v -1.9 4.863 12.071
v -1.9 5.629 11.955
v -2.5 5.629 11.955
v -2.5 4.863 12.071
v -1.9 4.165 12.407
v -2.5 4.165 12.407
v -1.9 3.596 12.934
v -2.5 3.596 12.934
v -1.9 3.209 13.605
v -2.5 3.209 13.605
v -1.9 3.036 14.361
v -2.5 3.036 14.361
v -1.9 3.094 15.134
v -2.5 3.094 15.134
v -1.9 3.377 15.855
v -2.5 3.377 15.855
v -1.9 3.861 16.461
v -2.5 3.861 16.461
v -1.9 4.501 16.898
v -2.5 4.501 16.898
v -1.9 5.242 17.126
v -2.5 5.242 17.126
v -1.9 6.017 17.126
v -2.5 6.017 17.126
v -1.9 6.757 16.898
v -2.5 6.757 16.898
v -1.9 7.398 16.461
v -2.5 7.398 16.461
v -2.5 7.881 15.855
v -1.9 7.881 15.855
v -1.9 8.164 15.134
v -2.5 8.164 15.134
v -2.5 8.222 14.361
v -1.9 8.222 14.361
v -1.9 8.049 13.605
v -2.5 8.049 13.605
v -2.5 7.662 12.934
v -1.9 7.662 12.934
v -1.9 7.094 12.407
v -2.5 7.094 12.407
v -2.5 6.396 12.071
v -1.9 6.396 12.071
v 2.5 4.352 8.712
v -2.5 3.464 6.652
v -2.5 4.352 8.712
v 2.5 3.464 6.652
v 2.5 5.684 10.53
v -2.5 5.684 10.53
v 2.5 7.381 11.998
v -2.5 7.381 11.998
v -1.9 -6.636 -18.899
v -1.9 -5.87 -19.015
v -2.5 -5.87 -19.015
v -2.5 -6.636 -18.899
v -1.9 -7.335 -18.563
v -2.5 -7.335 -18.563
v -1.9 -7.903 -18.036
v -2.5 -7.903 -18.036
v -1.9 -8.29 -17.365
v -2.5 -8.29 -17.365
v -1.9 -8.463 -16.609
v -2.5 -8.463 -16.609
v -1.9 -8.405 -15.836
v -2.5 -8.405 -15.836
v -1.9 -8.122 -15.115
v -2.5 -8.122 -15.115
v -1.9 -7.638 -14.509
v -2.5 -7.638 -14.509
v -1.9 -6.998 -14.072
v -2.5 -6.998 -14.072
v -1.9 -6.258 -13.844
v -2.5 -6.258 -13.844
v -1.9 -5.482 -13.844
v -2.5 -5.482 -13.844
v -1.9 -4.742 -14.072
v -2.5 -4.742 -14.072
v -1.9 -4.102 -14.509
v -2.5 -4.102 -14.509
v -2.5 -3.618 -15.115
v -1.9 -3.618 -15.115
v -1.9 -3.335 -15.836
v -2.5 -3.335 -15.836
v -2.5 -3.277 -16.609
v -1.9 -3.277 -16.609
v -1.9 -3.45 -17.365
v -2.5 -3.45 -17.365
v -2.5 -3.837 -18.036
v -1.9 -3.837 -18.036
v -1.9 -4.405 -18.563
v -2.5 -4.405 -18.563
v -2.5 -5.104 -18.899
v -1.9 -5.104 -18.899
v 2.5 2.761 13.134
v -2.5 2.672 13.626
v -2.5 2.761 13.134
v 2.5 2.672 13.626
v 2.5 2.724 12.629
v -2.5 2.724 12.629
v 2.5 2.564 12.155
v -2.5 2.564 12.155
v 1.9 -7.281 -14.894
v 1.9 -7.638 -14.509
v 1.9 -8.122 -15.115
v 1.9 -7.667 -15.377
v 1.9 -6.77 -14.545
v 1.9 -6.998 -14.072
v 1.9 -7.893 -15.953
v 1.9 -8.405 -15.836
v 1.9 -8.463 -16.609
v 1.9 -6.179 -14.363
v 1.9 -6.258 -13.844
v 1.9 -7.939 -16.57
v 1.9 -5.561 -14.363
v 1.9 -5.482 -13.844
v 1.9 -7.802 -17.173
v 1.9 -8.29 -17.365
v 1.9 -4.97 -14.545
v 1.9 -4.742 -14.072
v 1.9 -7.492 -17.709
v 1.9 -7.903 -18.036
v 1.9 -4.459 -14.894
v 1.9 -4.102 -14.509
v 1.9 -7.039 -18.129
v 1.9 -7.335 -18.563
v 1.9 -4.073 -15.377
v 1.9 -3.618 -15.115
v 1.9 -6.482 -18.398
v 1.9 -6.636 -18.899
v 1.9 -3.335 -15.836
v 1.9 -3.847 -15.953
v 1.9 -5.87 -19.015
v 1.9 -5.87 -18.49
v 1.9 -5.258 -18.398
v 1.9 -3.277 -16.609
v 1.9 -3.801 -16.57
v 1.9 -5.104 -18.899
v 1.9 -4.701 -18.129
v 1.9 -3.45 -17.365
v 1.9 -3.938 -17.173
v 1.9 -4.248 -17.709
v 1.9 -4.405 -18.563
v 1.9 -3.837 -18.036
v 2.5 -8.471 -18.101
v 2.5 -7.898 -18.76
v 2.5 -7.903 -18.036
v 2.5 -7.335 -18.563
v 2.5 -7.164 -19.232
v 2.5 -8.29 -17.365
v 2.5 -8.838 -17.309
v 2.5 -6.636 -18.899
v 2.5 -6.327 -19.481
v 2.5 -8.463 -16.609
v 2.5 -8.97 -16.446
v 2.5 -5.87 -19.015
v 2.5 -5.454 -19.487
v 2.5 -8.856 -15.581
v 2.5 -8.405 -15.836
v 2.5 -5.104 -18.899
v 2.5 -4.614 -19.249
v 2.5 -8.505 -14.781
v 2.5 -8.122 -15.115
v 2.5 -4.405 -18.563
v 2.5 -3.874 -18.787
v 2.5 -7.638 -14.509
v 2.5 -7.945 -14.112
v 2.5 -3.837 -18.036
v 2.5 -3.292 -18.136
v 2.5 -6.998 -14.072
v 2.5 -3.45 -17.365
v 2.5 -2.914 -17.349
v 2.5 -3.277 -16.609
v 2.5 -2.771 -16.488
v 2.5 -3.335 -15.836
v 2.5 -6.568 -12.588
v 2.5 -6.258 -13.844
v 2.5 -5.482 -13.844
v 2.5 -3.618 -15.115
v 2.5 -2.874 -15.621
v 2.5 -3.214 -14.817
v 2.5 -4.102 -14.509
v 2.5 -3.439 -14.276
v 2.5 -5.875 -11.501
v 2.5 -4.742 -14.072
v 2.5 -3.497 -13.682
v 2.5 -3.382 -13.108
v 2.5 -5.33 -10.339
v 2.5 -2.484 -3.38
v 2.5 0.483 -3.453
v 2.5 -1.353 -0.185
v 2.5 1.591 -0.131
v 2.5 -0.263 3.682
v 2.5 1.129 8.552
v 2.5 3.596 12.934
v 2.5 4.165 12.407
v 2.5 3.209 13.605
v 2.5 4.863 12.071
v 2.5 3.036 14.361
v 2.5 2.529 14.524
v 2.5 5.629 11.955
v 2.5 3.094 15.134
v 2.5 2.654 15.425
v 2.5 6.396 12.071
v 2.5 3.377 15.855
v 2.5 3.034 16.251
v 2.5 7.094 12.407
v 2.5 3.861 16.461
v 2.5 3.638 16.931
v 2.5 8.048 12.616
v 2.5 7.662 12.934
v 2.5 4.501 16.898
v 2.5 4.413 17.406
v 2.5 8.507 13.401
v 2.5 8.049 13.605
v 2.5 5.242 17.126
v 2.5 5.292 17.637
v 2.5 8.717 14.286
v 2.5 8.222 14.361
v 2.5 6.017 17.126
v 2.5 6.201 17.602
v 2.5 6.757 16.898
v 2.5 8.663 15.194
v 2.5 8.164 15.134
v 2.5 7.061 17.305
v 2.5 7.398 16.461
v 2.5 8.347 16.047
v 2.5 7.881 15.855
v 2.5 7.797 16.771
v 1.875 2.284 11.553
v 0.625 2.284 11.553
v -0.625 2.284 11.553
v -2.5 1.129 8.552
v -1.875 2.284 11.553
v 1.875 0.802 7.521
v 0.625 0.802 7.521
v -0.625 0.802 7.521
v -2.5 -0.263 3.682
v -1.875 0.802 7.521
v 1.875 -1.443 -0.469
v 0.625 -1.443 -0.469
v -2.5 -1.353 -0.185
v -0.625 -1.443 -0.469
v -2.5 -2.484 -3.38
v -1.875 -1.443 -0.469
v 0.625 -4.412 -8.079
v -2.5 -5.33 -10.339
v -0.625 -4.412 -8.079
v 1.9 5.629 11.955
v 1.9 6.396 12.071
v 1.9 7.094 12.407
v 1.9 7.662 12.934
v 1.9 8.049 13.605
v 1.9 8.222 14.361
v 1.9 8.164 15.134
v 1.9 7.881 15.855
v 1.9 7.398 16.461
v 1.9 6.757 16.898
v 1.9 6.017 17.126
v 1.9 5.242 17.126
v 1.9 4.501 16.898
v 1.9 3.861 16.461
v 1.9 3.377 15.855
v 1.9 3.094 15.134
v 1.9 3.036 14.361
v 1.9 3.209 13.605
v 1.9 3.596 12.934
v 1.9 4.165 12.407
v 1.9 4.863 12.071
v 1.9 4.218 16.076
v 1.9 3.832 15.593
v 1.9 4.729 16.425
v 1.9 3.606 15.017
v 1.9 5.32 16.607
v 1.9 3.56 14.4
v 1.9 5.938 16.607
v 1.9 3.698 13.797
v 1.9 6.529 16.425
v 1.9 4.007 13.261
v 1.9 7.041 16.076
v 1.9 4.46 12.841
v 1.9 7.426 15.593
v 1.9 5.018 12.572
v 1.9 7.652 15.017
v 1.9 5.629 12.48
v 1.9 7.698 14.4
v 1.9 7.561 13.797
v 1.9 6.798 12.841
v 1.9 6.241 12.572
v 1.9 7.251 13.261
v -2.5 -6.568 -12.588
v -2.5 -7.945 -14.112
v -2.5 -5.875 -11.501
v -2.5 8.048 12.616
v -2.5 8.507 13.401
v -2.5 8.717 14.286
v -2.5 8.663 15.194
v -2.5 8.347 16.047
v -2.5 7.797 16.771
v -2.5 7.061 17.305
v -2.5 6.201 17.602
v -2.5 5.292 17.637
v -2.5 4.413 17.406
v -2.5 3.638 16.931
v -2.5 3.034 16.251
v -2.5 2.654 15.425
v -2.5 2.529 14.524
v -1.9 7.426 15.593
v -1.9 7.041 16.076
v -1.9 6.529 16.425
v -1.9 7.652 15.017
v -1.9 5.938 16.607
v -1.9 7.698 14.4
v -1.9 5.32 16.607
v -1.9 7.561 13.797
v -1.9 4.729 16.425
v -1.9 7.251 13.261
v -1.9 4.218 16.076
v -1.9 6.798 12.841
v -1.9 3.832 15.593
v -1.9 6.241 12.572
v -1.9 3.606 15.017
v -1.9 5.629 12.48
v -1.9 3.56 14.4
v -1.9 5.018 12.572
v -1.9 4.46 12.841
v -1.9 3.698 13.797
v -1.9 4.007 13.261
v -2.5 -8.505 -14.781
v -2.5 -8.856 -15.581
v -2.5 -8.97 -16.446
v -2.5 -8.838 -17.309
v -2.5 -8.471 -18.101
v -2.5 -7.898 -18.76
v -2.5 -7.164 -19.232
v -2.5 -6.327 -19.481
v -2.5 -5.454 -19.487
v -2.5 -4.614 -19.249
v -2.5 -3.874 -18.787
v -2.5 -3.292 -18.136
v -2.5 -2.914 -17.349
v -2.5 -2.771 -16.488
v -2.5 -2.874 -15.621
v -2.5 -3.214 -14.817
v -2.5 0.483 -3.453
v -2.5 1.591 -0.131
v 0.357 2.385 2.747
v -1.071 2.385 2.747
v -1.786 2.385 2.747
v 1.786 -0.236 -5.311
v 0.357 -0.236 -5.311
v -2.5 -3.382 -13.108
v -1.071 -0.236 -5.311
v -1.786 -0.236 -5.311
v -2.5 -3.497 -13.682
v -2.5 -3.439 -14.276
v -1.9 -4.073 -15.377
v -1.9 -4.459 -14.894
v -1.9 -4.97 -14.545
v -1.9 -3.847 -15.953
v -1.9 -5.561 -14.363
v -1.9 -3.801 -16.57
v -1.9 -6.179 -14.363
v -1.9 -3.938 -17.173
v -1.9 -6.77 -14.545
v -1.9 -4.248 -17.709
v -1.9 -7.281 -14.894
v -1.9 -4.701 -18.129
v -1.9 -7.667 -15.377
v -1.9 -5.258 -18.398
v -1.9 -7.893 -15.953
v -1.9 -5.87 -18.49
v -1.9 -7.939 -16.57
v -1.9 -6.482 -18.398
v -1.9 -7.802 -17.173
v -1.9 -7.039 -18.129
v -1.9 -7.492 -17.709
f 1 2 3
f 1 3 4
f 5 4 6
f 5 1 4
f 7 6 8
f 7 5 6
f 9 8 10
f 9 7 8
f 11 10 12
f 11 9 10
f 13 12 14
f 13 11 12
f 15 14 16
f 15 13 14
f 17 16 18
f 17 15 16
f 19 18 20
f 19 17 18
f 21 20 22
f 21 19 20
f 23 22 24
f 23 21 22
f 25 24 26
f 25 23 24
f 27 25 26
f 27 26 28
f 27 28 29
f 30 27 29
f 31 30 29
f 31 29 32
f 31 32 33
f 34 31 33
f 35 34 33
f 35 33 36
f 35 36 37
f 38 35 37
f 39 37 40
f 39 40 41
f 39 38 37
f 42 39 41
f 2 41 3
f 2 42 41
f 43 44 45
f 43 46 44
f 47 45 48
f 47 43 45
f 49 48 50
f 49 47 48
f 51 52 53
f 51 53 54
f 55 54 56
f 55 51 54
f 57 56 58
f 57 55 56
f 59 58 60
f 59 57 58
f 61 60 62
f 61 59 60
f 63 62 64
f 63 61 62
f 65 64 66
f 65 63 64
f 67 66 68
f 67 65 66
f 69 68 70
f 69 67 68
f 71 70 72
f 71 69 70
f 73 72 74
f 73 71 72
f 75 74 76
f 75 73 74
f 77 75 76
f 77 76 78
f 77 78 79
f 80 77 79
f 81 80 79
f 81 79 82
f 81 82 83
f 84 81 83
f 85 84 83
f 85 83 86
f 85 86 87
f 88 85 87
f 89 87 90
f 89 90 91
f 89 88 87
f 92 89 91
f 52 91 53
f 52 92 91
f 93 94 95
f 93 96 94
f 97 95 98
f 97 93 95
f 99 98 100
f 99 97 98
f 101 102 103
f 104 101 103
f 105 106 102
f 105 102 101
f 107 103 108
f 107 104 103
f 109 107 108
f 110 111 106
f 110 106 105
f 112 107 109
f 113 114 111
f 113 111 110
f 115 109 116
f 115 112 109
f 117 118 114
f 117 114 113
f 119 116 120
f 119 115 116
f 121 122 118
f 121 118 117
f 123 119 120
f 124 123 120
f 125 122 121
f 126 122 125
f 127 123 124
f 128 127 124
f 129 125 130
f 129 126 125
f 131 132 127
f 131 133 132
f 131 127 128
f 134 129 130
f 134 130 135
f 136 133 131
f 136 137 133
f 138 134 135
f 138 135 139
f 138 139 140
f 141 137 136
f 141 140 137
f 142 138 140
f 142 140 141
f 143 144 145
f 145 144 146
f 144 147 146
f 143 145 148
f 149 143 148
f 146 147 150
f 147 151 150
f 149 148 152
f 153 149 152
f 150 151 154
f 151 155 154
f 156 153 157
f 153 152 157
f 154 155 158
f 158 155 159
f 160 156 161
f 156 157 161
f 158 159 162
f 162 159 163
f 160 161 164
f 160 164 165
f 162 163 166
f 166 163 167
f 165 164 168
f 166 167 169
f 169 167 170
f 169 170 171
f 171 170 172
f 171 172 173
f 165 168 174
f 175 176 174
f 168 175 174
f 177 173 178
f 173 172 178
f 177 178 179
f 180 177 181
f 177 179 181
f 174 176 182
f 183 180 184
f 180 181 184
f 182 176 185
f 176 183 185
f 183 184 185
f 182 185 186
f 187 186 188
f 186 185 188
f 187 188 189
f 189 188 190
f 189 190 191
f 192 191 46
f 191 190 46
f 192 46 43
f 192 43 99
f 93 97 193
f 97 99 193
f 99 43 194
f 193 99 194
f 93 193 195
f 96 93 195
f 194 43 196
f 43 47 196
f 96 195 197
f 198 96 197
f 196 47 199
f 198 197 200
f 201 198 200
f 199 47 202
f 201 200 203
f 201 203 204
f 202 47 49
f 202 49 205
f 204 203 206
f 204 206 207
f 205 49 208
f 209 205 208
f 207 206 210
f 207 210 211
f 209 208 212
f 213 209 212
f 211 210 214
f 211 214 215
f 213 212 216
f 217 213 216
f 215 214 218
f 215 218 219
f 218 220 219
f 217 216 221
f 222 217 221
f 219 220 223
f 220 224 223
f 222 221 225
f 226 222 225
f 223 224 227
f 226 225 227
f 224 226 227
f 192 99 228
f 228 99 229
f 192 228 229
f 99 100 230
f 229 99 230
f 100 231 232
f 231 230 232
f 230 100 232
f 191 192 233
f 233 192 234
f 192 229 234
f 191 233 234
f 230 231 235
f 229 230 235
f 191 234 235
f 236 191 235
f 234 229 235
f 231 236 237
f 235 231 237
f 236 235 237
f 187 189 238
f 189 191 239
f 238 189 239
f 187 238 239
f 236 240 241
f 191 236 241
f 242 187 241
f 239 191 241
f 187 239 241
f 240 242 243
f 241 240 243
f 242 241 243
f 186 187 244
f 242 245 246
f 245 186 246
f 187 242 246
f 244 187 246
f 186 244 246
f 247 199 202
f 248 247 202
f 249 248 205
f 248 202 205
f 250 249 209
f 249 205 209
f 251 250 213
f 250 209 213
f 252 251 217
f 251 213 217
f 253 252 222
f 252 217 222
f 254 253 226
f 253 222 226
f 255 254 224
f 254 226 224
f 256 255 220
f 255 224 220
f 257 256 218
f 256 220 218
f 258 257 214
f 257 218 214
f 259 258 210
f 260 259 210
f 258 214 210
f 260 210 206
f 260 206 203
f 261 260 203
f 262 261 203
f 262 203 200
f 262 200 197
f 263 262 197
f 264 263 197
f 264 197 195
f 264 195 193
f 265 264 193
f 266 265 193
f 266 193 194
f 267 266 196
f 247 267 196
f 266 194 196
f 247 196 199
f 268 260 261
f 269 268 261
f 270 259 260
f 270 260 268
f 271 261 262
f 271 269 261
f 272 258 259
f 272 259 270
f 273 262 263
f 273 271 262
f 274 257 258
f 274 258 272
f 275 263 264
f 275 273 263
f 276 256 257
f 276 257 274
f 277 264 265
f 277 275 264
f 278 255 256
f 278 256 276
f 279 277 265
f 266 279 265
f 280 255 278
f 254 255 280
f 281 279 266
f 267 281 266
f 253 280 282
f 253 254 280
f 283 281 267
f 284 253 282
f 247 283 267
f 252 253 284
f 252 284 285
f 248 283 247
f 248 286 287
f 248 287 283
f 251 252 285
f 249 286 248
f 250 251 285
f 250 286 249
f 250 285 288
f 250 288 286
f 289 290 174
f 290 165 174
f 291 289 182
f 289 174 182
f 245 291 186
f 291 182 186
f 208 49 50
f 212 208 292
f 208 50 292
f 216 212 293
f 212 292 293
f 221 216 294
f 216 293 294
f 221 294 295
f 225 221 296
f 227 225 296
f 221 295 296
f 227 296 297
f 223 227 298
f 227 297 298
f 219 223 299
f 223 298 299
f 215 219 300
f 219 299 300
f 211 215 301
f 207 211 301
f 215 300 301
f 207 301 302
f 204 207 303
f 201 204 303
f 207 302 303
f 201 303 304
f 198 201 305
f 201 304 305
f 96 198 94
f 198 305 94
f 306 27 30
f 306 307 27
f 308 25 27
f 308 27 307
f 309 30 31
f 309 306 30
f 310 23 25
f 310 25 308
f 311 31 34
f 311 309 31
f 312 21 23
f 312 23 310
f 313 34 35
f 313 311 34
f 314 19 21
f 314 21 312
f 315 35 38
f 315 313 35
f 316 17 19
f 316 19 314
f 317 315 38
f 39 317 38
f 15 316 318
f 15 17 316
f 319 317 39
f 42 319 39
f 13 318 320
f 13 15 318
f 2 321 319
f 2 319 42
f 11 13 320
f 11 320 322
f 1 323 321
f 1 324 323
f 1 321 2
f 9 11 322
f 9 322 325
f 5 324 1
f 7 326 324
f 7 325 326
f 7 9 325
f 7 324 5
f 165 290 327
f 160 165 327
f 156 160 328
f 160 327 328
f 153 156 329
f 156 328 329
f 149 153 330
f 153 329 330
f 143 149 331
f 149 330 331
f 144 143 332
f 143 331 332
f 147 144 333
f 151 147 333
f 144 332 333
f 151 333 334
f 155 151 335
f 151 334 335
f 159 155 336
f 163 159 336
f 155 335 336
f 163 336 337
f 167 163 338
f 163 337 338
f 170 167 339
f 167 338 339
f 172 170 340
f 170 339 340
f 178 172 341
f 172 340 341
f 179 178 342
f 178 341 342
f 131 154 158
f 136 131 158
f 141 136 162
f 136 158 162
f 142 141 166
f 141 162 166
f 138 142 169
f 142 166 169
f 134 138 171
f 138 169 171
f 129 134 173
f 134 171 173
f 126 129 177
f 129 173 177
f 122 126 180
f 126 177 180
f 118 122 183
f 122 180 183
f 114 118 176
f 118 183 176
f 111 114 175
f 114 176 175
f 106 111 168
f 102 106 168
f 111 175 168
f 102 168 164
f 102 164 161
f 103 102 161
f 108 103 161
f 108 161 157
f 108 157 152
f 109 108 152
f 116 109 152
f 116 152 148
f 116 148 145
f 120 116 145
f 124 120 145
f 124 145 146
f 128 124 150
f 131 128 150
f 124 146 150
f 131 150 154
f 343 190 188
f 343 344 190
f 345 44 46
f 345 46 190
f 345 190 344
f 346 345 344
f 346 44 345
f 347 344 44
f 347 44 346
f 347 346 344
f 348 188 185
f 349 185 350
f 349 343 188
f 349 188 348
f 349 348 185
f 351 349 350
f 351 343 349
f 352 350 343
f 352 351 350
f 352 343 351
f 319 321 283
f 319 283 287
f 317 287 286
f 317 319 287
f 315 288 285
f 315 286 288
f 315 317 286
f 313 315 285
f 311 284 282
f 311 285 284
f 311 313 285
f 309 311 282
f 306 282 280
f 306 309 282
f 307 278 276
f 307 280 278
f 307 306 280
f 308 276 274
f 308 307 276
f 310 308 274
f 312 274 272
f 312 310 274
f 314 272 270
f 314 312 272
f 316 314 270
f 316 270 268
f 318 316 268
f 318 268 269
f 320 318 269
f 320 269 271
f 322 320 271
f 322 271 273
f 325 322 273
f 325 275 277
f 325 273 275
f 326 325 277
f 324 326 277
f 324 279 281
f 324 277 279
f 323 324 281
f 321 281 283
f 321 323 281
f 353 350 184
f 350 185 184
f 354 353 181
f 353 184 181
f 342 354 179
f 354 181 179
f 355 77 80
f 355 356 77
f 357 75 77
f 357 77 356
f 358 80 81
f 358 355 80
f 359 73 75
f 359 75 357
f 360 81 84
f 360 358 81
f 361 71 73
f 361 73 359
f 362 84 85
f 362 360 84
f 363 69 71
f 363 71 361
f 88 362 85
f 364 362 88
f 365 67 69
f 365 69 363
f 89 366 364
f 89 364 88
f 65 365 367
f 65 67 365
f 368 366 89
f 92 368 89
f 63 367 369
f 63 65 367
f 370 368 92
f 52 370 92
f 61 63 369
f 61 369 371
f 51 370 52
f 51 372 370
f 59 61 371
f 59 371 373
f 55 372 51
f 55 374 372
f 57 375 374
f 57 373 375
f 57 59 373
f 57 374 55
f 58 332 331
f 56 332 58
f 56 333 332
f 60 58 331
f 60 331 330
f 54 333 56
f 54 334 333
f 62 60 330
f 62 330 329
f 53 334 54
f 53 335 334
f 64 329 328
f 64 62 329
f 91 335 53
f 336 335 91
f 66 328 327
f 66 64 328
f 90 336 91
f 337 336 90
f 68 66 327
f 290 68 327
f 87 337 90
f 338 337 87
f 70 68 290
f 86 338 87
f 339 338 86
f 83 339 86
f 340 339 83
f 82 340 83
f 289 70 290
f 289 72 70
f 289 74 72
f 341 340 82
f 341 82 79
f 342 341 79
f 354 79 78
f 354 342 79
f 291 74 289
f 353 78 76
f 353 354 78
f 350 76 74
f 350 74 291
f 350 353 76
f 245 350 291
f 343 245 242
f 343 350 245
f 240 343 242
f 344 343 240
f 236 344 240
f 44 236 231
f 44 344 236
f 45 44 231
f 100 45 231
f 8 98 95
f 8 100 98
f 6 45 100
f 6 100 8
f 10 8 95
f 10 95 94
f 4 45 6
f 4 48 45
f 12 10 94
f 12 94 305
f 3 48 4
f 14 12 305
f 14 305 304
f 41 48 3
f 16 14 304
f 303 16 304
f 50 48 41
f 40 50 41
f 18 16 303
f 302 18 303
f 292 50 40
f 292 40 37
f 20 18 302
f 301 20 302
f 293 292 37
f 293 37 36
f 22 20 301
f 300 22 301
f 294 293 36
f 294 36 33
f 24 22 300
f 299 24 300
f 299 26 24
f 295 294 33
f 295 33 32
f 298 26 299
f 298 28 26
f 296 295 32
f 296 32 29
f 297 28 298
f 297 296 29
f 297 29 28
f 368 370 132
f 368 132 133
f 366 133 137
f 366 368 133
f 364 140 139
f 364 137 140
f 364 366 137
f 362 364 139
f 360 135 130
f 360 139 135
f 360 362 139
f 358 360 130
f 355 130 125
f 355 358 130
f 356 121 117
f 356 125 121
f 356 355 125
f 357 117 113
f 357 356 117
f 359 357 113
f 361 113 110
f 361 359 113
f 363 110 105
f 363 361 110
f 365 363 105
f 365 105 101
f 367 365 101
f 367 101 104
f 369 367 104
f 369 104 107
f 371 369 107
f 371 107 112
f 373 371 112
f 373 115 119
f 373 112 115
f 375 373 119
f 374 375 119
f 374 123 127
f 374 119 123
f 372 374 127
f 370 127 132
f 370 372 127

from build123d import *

# Parameters (mm, degrees)
BOSS_EXTRUDE1_START     = -2.5
BOSS_EXTRUDE1_OUTLINE_R = 2.075
BOSS_EXTRUDE1_DEPTH     = 5
FILLET1_R               = 10
FILLET2_R               = 2
SKETCH6_R               = 2.6
CUT_EXTRUDE3_DEPTH      = 0.6
CUT_EXTRUDE4_START      = -0.6
SKETCH7_R               = 2.6
CUT_EXTRUDE4_DEPTH      = 0.6


# Read off the part's stored shape, not the designer's step: Boss-Extrude1
with BuildPart() as part:
    # Boss-Extrude1 outline → Boss-Extrude1 (new body)
    with BuildSketch(Plane(origin=(0, 0, 0), x_dir=(0, 0, -1), z_dir=(1, 0, 0)).offset(BOSS_EXTRUDE1_START)):
        with BuildLine():
            add(Edge.make_bspline(
                [(-11.467428758, 5.351849738), (-9.981579618, 4.577281332), (-7.160995192, 3.544086065), (-2.770125707, 2.396619441), (1.347799898, 1.288727674), (5.338957915, -0.215867298), (9.160320461, -1.841071211), (12.08438205, -3.026761323), (13.750853903, -3.610645605), (14.156821659, -3.746175483)],
                knots=[0.086388593, 0.086388593, 0.086388593, 0.086388593, 0.25, 0.375, 0.5, 0.625, 0.75, 0.875, 0.915118366, 0.915118366, 0.915118366, 0.915118366], degree=3))
            ThreePointArc((-11.467428758, 5.351849738), (-17.182273296, 7.274593649), (-12.95766118, 2.972379718))
            add(Edge.make_bspline(
                [(-12.95766118, 2.972379718), (-12.493747453, 2.724314548), (-10.717791227, 1.858624399), (-7.52529105, 0.743374894), (-3.440580849, -0.32158746), (0.497631851, -1.383173076), (4.262093967, -2.802436867), (8.066886426, -4.418200775), (11.094789528, -5.649756293), (12.901972126, -6.280277824), (13.366776805, -6.434212154)],
                knots=[0.08026374, 0.08026374, 0.08026374, 0.08026374, 0.125, 0.25, 0.375, 0.5, 0.625, 0.75, 0.875, 0.917835676, 0.917835676, 0.917835676, 0.917835676], degree=3))
            ThreePointArc((13.366776805, -6.434212154), (19.389198985, -6.744151246), (14.156821659, -3.746175483))
        make_face()
        with Locations((16.415, -5.87)):
            Circle(BOSS_EXTRUDE1_OUTLINE_R, mode=Mode.SUBTRACT)
        with Locations((-14.555, 5.629165125)):
            Circle(BOSS_EXTRUDE1_OUTLINE_R, mode=Mode.SUBTRACT)
    extrude(amount=BOSS_EXTRUDE1_DEPTH)

    # Fillet1
    fillet1_edges = [part.edges().sort_by_distance(p)[0] for p in [
        (0, -6.434212154, -13.366776805),
        (0, 5.351849738, 11.467428758),
    ]]
    fillet(fillet1_edges, radius=FILLET1_R)

    # Fillet2
    fillet2_edges = [part.edges().sort_by_distance(p)[0] for p in [
        (0, -3.746175483, -14.156821659),
        (0, 2.972379718, 12.95766118),
    ]]
    fillet(fillet2_edges, radius=FILLET2_R)

    # Sketch6 → Cut-Extrude3 (cut)
    with BuildSketch(Plane(origin=(2.5, 0, 0), x_dir=(0, 0, -1), z_dir=(1, 0, 0))):
        with Locations((-14.555, 5.629165125)):
            Circle(SKETCH6_R)
        with Locations((16.415, -5.87)):
            Circle(SKETCH6_R)
    extrude(amount=-CUT_EXTRUDE3_DEPTH, mode=Mode.SUBTRACT)

    # Sketch7 → Cut-Extrude4 (cut)
    with BuildSketch(Plane.ZY.offset(2.5).offset(CUT_EXTRUDE4_START)):
        with Locations(Location((14.555, 5.629165125, 0), (0, 0, 180))):
            Circle(SKETCH7_R)
        with Locations(Location((-16.415, -5.87, 0), (0, 0, 180))):
            Circle(SKETCH7_R)
    extrude(amount=CUT_EXTRUDE4_DEPTH, mode=Mode.SUBTRACT)


solid = part.part
